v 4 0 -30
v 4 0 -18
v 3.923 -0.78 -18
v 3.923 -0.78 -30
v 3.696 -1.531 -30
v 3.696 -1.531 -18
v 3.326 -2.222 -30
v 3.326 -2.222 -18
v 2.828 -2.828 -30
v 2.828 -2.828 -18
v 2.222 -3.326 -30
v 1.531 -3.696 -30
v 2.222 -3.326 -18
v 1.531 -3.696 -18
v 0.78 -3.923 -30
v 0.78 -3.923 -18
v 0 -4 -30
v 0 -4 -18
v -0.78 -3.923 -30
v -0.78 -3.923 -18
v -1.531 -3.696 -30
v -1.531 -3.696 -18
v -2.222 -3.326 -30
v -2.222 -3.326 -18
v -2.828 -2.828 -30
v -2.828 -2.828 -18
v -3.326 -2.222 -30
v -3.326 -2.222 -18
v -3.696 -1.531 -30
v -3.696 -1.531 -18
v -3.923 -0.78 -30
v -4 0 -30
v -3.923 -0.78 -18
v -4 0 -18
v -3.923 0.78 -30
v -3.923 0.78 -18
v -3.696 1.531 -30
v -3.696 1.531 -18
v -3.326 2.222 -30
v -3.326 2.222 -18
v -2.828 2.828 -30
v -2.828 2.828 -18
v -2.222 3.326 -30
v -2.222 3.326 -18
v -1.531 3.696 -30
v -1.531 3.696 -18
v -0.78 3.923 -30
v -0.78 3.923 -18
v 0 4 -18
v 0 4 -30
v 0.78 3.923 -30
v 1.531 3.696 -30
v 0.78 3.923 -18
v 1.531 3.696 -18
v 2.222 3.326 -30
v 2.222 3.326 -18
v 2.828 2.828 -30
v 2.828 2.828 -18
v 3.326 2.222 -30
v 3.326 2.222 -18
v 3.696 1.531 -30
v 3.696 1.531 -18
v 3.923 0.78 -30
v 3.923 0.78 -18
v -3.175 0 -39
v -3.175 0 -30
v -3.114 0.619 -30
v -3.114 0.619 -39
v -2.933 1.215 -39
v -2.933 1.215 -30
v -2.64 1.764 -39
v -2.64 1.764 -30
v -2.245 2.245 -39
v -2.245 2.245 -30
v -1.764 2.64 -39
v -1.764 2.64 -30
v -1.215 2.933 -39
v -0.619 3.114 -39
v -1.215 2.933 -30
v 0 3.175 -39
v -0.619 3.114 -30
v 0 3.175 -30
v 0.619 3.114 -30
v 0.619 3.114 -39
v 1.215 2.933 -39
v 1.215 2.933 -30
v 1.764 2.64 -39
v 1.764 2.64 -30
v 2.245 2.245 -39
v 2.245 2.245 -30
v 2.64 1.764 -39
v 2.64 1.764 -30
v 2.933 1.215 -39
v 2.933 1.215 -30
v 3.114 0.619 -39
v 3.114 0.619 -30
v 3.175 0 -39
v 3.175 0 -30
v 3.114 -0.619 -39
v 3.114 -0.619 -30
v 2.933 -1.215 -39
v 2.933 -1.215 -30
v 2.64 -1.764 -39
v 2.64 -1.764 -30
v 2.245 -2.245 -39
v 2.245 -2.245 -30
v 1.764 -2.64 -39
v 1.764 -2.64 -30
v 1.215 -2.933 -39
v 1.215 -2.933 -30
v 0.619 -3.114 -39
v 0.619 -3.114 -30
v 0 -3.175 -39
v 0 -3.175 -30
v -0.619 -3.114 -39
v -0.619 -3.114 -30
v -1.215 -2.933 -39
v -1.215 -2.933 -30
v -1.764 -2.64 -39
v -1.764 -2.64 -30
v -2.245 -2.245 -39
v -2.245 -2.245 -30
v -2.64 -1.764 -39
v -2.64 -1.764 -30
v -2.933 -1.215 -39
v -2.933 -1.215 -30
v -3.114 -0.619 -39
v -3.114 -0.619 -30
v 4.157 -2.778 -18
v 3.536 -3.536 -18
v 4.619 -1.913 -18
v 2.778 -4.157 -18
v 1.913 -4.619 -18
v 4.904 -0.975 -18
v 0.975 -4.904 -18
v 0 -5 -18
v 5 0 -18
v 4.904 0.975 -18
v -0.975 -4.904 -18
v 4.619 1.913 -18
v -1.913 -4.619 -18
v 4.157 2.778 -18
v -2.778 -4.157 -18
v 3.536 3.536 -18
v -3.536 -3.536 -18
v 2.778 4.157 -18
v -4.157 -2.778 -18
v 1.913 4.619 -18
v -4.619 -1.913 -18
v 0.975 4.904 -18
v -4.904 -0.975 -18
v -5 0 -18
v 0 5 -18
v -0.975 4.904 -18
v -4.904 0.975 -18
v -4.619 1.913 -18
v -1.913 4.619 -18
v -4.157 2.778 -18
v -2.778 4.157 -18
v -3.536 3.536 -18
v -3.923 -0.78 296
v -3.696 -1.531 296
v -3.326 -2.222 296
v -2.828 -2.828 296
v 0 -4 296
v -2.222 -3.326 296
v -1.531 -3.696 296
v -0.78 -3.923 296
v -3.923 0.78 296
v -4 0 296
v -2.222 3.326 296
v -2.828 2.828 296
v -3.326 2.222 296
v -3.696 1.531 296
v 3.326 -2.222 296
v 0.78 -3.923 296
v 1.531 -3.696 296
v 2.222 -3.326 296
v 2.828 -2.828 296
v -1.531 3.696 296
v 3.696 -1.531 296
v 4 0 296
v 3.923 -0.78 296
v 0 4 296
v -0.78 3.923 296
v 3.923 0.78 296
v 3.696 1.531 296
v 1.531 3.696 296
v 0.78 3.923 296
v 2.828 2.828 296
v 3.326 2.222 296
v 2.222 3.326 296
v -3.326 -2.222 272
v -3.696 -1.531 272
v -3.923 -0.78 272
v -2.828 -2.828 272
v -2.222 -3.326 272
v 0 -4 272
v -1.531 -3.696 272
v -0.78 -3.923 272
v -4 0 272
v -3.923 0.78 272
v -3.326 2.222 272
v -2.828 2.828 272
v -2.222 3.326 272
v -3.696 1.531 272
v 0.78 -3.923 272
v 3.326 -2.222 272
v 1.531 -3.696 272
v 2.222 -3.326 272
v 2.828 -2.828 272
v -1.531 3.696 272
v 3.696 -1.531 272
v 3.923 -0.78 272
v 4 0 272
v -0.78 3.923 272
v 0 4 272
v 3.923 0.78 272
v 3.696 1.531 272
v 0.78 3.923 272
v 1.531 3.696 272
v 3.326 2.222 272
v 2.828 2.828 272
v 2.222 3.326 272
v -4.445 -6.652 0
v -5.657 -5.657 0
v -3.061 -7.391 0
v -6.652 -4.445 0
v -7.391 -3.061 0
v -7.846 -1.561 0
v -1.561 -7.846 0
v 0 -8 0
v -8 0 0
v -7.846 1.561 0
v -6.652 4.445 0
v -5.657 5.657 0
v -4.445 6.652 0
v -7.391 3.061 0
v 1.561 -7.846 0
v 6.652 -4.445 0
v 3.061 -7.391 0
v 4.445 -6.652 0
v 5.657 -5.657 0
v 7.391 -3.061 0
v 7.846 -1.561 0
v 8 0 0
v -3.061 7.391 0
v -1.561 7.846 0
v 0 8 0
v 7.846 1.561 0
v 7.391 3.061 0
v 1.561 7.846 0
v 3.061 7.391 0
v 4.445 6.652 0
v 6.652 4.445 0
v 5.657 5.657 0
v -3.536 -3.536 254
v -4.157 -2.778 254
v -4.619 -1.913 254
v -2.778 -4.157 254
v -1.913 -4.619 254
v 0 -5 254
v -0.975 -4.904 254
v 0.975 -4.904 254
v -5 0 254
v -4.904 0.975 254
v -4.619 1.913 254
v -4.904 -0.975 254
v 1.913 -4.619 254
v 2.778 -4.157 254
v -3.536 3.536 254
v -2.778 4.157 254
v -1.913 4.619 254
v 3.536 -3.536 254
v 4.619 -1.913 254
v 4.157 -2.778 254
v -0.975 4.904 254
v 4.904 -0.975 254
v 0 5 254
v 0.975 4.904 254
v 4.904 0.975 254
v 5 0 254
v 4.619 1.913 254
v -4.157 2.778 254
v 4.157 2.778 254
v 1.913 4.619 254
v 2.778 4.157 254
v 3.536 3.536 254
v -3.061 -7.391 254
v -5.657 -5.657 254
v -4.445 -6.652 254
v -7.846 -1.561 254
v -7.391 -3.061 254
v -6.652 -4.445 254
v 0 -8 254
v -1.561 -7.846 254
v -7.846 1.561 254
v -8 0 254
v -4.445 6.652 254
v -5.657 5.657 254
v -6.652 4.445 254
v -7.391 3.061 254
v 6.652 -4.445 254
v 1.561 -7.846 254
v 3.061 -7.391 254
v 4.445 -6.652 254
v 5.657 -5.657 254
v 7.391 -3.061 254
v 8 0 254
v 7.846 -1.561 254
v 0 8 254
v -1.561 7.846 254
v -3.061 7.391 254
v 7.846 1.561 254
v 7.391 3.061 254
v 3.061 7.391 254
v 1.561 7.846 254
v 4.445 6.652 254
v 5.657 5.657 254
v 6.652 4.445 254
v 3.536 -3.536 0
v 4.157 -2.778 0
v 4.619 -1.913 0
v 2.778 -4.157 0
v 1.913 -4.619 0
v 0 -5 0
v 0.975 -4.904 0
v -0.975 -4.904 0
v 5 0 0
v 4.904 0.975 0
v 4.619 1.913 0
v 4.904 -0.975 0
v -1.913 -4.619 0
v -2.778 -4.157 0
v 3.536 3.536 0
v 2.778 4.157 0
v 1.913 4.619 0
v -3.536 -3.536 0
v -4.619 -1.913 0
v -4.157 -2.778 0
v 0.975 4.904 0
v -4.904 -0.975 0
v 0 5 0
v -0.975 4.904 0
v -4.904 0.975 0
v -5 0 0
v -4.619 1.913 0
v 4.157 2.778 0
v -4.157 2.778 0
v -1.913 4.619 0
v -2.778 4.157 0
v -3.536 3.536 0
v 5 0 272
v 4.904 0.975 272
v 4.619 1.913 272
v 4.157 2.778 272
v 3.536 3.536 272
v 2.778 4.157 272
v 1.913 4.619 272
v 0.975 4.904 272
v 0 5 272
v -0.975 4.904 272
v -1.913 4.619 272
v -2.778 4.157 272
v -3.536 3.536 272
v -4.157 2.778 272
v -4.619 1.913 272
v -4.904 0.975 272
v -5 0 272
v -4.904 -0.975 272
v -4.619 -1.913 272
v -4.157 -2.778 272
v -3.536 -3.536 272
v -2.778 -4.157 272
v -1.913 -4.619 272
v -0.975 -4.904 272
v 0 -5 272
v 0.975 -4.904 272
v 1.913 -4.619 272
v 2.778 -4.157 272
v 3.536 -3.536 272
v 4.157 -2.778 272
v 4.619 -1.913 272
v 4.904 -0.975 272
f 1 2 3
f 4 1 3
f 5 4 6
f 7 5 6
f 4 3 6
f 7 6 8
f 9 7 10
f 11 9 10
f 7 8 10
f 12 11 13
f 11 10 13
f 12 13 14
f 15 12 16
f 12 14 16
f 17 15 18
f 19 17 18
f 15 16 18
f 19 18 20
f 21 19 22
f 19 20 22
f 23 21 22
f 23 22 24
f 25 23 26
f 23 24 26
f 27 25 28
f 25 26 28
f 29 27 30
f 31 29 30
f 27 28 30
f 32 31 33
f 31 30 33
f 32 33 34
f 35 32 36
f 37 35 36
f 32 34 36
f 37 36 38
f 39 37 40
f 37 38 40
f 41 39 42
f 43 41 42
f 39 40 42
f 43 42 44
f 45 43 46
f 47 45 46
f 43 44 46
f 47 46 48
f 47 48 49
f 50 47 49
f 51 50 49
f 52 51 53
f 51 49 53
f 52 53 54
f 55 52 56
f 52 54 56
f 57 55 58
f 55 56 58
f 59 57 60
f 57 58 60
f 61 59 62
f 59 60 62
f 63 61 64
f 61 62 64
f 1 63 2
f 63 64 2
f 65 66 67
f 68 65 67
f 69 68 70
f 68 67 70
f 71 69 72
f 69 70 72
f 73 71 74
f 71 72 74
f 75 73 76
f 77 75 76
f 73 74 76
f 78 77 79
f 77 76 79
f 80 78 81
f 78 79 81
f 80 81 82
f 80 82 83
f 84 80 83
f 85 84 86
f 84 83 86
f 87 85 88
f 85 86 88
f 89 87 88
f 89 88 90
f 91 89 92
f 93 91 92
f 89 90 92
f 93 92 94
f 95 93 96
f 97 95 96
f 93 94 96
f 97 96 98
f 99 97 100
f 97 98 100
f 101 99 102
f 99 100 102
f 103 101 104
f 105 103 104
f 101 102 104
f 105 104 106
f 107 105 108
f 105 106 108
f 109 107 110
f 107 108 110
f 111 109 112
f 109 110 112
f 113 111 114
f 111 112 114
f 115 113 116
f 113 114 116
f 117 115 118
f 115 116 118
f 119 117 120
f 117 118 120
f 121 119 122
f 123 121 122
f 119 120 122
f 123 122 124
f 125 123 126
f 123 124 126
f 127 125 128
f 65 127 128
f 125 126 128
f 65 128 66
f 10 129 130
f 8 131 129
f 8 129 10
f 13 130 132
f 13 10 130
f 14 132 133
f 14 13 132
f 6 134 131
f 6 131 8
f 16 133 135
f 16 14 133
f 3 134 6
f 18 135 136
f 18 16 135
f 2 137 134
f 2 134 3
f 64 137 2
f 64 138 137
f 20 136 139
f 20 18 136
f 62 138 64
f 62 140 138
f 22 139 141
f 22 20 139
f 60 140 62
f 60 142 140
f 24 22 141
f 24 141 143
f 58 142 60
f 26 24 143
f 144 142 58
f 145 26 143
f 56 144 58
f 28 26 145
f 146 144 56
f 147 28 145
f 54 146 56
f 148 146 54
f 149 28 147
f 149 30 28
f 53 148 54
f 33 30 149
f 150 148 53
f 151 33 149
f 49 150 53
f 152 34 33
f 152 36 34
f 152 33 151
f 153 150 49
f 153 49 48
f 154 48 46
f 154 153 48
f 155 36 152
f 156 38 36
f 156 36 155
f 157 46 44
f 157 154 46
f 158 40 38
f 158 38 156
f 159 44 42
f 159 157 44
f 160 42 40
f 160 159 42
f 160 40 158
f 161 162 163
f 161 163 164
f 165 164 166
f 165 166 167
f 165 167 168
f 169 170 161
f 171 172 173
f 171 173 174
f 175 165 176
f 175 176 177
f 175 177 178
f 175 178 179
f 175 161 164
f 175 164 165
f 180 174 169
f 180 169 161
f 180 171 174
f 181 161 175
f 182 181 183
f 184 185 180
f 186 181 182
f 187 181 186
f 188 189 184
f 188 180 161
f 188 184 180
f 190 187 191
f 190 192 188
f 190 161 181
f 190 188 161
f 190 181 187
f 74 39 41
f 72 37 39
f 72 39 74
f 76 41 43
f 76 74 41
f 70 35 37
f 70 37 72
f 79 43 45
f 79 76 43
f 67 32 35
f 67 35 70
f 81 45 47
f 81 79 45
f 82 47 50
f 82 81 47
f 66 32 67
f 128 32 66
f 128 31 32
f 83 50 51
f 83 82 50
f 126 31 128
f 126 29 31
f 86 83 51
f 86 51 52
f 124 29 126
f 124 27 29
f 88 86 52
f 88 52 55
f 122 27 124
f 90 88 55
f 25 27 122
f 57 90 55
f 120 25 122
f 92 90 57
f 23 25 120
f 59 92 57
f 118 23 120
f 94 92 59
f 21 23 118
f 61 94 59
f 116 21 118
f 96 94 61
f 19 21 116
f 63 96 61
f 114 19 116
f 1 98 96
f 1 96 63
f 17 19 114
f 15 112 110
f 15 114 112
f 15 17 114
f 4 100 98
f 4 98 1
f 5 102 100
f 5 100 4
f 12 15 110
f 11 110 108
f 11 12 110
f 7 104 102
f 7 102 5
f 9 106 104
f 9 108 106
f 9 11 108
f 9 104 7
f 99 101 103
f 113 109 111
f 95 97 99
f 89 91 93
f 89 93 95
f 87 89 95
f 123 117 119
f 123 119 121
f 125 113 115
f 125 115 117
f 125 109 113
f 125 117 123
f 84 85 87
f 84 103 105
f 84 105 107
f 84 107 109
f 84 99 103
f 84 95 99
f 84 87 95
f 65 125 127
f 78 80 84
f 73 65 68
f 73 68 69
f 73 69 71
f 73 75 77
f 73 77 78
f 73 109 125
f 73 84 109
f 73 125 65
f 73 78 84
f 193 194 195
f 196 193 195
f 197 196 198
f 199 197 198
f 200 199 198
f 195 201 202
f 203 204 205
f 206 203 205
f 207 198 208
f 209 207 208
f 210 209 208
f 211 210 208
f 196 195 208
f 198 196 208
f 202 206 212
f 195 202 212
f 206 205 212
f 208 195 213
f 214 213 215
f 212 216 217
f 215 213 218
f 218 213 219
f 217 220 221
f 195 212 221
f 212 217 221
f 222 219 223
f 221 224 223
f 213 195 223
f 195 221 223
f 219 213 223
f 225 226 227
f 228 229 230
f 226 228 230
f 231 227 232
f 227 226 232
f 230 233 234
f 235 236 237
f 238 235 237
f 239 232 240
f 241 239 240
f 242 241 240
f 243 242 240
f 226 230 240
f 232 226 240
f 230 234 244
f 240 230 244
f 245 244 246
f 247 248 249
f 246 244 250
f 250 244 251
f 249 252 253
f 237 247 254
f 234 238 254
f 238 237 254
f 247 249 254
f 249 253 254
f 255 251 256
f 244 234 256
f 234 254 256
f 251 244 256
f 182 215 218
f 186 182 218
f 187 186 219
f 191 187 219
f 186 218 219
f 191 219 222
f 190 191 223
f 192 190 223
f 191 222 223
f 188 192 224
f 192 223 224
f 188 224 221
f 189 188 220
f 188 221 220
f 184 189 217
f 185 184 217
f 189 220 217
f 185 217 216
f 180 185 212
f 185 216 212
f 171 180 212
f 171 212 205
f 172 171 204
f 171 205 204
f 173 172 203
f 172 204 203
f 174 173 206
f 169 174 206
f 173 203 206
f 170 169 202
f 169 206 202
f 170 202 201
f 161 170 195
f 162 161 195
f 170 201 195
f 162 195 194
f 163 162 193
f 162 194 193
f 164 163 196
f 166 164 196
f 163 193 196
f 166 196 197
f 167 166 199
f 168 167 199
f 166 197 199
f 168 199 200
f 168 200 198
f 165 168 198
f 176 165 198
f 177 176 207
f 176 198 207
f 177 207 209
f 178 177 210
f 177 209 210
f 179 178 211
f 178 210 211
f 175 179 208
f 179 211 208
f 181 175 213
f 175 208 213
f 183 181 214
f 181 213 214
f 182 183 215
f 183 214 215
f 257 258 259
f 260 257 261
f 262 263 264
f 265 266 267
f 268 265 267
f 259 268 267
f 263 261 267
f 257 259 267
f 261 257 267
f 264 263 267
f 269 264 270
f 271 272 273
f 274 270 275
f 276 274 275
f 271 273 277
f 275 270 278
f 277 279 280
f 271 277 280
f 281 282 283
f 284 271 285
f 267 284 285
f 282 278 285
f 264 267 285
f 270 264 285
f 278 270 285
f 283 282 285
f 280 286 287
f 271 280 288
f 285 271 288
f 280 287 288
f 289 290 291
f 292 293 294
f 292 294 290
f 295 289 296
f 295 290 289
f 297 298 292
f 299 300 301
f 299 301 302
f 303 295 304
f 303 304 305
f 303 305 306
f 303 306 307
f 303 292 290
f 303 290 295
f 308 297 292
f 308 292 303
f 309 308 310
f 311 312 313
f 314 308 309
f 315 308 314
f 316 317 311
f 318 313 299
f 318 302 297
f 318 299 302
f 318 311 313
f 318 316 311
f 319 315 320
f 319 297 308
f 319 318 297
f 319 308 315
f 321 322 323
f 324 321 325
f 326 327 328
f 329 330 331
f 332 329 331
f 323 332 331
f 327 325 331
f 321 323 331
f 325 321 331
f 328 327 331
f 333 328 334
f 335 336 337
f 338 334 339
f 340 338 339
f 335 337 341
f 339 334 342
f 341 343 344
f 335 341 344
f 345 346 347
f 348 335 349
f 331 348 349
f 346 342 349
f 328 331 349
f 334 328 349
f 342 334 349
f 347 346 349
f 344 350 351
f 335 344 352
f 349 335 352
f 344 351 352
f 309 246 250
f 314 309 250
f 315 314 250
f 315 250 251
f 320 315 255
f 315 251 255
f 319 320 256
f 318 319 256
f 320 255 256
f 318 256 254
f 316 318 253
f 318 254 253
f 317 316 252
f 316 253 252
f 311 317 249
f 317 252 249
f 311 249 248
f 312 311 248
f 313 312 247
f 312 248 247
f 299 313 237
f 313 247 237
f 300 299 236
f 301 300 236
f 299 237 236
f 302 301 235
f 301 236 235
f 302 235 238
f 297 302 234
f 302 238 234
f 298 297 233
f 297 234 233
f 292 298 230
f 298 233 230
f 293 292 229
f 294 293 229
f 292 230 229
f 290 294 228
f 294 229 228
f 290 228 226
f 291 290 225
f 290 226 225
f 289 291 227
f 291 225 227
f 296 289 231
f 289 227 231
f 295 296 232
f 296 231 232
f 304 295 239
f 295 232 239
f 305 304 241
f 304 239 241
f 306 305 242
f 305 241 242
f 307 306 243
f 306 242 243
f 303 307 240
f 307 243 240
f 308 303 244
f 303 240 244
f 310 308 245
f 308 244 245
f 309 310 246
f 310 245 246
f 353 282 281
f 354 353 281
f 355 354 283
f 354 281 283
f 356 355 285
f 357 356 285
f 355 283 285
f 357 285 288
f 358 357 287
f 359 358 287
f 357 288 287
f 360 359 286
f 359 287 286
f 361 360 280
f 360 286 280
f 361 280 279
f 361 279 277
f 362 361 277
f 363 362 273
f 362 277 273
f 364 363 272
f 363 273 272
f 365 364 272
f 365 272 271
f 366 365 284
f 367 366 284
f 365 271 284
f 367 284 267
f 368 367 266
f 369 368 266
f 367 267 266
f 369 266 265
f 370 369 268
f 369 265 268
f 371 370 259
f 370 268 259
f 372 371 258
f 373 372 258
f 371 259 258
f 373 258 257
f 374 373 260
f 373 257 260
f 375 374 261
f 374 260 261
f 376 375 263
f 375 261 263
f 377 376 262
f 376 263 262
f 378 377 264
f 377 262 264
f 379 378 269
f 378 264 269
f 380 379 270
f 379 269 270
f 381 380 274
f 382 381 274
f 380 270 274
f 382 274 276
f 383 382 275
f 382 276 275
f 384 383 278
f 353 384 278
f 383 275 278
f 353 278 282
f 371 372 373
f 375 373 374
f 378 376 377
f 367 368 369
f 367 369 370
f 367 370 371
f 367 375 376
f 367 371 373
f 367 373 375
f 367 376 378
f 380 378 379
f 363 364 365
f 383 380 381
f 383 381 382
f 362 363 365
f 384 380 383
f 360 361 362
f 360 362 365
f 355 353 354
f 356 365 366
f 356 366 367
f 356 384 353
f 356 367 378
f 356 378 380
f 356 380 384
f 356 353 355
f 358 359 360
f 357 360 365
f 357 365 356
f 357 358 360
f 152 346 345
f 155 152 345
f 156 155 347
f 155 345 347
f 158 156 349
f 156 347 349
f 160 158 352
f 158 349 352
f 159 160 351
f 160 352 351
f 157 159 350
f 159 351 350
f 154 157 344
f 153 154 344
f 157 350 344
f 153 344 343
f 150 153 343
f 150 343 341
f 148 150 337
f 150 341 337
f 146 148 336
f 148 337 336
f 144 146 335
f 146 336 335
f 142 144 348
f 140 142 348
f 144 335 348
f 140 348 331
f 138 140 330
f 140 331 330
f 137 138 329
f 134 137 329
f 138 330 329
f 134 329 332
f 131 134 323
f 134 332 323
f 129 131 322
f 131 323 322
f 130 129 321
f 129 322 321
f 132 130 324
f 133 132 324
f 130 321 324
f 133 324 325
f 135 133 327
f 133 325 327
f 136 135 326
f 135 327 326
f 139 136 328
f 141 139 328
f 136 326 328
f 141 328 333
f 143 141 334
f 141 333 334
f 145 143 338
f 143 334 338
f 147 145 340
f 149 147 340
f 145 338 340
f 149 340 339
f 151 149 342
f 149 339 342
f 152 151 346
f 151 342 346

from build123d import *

# Parameters (mm, degrees)
SKETCH_1_R      = 8
EXTRUDE_1_DEPTH = 254
SKETCH_2_R      = 5
EXTRUDE_2_DEPTH = 18
SKETCH_4_R      = 5
EXTRUDE_3_DEPTH = 18
SKETCH_5_R      = 4
EXTRUDE_4_DEPTH = 24
SKETCH_9_R      = 4
EXTRUDE_5_DEPTH = 12
SKETCH_10_R     = 3.175
EXTRUDE_6_DEPTH = 9


with BuildPart() as part:
    # 草图1 → 凸台-拉伸1 (new body)
    with BuildSketch(Plane.XY):
        Circle(SKETCH_1_R)
    extrude(amount=EXTRUDE_1_DEPTH)


with BuildPart() as body_2:
    # 草图2 → 凸台-拉伸2 (new body)
    with BuildSketch(Plane.XY.offset(254)):
        Circle(SKETCH_2_R)
    extrude(amount=EXTRUDE_2_DEPTH)


with BuildPart() as body_3:
    # 草图4 → 凸台-拉伸3 (new body)
    with BuildSketch(Plane(origin=(0, 0, 0), x_dir=(-1, 0, 0), z_dir=(0, 0, -1))):
        Circle(SKETCH_4_R)
    extrude(amount=EXTRUDE_3_DEPTH)

    # 草图9 → 凸台-拉伸5 (add)
    with BuildSketch(Plane(origin=(0, 0, -18), x_dir=(-1, 0, 0), z_dir=(0, 0, -1))):
        with Locations(Location((0, 0, 0), (0, 0, 180))):
            Circle(SKETCH_9_R)
    extrude(amount=EXTRUDE_5_DEPTH)

    # 草图10 → 凸台-拉伸6 (add)
    with BuildSketch(Plane(origin=(0, 0, -30), x_dir=(-1, 0, 0), z_dir=(0, 0, -1))):
        Circle(SKETCH_10_R)
    extrude(amount=EXTRUDE_6_DEPTH)


with BuildPart() as body_4:
    # 草图5 → 凸台-拉伸4 (new body)
    with BuildSketch(Plane.XY.offset(272)):
        Circle(SKETCH_5_R)
    extrude(amount=EXTRUDE_4_DEPTH)


solid = Compound([part.part, body_2.part, body_3.part, body_4.part])
